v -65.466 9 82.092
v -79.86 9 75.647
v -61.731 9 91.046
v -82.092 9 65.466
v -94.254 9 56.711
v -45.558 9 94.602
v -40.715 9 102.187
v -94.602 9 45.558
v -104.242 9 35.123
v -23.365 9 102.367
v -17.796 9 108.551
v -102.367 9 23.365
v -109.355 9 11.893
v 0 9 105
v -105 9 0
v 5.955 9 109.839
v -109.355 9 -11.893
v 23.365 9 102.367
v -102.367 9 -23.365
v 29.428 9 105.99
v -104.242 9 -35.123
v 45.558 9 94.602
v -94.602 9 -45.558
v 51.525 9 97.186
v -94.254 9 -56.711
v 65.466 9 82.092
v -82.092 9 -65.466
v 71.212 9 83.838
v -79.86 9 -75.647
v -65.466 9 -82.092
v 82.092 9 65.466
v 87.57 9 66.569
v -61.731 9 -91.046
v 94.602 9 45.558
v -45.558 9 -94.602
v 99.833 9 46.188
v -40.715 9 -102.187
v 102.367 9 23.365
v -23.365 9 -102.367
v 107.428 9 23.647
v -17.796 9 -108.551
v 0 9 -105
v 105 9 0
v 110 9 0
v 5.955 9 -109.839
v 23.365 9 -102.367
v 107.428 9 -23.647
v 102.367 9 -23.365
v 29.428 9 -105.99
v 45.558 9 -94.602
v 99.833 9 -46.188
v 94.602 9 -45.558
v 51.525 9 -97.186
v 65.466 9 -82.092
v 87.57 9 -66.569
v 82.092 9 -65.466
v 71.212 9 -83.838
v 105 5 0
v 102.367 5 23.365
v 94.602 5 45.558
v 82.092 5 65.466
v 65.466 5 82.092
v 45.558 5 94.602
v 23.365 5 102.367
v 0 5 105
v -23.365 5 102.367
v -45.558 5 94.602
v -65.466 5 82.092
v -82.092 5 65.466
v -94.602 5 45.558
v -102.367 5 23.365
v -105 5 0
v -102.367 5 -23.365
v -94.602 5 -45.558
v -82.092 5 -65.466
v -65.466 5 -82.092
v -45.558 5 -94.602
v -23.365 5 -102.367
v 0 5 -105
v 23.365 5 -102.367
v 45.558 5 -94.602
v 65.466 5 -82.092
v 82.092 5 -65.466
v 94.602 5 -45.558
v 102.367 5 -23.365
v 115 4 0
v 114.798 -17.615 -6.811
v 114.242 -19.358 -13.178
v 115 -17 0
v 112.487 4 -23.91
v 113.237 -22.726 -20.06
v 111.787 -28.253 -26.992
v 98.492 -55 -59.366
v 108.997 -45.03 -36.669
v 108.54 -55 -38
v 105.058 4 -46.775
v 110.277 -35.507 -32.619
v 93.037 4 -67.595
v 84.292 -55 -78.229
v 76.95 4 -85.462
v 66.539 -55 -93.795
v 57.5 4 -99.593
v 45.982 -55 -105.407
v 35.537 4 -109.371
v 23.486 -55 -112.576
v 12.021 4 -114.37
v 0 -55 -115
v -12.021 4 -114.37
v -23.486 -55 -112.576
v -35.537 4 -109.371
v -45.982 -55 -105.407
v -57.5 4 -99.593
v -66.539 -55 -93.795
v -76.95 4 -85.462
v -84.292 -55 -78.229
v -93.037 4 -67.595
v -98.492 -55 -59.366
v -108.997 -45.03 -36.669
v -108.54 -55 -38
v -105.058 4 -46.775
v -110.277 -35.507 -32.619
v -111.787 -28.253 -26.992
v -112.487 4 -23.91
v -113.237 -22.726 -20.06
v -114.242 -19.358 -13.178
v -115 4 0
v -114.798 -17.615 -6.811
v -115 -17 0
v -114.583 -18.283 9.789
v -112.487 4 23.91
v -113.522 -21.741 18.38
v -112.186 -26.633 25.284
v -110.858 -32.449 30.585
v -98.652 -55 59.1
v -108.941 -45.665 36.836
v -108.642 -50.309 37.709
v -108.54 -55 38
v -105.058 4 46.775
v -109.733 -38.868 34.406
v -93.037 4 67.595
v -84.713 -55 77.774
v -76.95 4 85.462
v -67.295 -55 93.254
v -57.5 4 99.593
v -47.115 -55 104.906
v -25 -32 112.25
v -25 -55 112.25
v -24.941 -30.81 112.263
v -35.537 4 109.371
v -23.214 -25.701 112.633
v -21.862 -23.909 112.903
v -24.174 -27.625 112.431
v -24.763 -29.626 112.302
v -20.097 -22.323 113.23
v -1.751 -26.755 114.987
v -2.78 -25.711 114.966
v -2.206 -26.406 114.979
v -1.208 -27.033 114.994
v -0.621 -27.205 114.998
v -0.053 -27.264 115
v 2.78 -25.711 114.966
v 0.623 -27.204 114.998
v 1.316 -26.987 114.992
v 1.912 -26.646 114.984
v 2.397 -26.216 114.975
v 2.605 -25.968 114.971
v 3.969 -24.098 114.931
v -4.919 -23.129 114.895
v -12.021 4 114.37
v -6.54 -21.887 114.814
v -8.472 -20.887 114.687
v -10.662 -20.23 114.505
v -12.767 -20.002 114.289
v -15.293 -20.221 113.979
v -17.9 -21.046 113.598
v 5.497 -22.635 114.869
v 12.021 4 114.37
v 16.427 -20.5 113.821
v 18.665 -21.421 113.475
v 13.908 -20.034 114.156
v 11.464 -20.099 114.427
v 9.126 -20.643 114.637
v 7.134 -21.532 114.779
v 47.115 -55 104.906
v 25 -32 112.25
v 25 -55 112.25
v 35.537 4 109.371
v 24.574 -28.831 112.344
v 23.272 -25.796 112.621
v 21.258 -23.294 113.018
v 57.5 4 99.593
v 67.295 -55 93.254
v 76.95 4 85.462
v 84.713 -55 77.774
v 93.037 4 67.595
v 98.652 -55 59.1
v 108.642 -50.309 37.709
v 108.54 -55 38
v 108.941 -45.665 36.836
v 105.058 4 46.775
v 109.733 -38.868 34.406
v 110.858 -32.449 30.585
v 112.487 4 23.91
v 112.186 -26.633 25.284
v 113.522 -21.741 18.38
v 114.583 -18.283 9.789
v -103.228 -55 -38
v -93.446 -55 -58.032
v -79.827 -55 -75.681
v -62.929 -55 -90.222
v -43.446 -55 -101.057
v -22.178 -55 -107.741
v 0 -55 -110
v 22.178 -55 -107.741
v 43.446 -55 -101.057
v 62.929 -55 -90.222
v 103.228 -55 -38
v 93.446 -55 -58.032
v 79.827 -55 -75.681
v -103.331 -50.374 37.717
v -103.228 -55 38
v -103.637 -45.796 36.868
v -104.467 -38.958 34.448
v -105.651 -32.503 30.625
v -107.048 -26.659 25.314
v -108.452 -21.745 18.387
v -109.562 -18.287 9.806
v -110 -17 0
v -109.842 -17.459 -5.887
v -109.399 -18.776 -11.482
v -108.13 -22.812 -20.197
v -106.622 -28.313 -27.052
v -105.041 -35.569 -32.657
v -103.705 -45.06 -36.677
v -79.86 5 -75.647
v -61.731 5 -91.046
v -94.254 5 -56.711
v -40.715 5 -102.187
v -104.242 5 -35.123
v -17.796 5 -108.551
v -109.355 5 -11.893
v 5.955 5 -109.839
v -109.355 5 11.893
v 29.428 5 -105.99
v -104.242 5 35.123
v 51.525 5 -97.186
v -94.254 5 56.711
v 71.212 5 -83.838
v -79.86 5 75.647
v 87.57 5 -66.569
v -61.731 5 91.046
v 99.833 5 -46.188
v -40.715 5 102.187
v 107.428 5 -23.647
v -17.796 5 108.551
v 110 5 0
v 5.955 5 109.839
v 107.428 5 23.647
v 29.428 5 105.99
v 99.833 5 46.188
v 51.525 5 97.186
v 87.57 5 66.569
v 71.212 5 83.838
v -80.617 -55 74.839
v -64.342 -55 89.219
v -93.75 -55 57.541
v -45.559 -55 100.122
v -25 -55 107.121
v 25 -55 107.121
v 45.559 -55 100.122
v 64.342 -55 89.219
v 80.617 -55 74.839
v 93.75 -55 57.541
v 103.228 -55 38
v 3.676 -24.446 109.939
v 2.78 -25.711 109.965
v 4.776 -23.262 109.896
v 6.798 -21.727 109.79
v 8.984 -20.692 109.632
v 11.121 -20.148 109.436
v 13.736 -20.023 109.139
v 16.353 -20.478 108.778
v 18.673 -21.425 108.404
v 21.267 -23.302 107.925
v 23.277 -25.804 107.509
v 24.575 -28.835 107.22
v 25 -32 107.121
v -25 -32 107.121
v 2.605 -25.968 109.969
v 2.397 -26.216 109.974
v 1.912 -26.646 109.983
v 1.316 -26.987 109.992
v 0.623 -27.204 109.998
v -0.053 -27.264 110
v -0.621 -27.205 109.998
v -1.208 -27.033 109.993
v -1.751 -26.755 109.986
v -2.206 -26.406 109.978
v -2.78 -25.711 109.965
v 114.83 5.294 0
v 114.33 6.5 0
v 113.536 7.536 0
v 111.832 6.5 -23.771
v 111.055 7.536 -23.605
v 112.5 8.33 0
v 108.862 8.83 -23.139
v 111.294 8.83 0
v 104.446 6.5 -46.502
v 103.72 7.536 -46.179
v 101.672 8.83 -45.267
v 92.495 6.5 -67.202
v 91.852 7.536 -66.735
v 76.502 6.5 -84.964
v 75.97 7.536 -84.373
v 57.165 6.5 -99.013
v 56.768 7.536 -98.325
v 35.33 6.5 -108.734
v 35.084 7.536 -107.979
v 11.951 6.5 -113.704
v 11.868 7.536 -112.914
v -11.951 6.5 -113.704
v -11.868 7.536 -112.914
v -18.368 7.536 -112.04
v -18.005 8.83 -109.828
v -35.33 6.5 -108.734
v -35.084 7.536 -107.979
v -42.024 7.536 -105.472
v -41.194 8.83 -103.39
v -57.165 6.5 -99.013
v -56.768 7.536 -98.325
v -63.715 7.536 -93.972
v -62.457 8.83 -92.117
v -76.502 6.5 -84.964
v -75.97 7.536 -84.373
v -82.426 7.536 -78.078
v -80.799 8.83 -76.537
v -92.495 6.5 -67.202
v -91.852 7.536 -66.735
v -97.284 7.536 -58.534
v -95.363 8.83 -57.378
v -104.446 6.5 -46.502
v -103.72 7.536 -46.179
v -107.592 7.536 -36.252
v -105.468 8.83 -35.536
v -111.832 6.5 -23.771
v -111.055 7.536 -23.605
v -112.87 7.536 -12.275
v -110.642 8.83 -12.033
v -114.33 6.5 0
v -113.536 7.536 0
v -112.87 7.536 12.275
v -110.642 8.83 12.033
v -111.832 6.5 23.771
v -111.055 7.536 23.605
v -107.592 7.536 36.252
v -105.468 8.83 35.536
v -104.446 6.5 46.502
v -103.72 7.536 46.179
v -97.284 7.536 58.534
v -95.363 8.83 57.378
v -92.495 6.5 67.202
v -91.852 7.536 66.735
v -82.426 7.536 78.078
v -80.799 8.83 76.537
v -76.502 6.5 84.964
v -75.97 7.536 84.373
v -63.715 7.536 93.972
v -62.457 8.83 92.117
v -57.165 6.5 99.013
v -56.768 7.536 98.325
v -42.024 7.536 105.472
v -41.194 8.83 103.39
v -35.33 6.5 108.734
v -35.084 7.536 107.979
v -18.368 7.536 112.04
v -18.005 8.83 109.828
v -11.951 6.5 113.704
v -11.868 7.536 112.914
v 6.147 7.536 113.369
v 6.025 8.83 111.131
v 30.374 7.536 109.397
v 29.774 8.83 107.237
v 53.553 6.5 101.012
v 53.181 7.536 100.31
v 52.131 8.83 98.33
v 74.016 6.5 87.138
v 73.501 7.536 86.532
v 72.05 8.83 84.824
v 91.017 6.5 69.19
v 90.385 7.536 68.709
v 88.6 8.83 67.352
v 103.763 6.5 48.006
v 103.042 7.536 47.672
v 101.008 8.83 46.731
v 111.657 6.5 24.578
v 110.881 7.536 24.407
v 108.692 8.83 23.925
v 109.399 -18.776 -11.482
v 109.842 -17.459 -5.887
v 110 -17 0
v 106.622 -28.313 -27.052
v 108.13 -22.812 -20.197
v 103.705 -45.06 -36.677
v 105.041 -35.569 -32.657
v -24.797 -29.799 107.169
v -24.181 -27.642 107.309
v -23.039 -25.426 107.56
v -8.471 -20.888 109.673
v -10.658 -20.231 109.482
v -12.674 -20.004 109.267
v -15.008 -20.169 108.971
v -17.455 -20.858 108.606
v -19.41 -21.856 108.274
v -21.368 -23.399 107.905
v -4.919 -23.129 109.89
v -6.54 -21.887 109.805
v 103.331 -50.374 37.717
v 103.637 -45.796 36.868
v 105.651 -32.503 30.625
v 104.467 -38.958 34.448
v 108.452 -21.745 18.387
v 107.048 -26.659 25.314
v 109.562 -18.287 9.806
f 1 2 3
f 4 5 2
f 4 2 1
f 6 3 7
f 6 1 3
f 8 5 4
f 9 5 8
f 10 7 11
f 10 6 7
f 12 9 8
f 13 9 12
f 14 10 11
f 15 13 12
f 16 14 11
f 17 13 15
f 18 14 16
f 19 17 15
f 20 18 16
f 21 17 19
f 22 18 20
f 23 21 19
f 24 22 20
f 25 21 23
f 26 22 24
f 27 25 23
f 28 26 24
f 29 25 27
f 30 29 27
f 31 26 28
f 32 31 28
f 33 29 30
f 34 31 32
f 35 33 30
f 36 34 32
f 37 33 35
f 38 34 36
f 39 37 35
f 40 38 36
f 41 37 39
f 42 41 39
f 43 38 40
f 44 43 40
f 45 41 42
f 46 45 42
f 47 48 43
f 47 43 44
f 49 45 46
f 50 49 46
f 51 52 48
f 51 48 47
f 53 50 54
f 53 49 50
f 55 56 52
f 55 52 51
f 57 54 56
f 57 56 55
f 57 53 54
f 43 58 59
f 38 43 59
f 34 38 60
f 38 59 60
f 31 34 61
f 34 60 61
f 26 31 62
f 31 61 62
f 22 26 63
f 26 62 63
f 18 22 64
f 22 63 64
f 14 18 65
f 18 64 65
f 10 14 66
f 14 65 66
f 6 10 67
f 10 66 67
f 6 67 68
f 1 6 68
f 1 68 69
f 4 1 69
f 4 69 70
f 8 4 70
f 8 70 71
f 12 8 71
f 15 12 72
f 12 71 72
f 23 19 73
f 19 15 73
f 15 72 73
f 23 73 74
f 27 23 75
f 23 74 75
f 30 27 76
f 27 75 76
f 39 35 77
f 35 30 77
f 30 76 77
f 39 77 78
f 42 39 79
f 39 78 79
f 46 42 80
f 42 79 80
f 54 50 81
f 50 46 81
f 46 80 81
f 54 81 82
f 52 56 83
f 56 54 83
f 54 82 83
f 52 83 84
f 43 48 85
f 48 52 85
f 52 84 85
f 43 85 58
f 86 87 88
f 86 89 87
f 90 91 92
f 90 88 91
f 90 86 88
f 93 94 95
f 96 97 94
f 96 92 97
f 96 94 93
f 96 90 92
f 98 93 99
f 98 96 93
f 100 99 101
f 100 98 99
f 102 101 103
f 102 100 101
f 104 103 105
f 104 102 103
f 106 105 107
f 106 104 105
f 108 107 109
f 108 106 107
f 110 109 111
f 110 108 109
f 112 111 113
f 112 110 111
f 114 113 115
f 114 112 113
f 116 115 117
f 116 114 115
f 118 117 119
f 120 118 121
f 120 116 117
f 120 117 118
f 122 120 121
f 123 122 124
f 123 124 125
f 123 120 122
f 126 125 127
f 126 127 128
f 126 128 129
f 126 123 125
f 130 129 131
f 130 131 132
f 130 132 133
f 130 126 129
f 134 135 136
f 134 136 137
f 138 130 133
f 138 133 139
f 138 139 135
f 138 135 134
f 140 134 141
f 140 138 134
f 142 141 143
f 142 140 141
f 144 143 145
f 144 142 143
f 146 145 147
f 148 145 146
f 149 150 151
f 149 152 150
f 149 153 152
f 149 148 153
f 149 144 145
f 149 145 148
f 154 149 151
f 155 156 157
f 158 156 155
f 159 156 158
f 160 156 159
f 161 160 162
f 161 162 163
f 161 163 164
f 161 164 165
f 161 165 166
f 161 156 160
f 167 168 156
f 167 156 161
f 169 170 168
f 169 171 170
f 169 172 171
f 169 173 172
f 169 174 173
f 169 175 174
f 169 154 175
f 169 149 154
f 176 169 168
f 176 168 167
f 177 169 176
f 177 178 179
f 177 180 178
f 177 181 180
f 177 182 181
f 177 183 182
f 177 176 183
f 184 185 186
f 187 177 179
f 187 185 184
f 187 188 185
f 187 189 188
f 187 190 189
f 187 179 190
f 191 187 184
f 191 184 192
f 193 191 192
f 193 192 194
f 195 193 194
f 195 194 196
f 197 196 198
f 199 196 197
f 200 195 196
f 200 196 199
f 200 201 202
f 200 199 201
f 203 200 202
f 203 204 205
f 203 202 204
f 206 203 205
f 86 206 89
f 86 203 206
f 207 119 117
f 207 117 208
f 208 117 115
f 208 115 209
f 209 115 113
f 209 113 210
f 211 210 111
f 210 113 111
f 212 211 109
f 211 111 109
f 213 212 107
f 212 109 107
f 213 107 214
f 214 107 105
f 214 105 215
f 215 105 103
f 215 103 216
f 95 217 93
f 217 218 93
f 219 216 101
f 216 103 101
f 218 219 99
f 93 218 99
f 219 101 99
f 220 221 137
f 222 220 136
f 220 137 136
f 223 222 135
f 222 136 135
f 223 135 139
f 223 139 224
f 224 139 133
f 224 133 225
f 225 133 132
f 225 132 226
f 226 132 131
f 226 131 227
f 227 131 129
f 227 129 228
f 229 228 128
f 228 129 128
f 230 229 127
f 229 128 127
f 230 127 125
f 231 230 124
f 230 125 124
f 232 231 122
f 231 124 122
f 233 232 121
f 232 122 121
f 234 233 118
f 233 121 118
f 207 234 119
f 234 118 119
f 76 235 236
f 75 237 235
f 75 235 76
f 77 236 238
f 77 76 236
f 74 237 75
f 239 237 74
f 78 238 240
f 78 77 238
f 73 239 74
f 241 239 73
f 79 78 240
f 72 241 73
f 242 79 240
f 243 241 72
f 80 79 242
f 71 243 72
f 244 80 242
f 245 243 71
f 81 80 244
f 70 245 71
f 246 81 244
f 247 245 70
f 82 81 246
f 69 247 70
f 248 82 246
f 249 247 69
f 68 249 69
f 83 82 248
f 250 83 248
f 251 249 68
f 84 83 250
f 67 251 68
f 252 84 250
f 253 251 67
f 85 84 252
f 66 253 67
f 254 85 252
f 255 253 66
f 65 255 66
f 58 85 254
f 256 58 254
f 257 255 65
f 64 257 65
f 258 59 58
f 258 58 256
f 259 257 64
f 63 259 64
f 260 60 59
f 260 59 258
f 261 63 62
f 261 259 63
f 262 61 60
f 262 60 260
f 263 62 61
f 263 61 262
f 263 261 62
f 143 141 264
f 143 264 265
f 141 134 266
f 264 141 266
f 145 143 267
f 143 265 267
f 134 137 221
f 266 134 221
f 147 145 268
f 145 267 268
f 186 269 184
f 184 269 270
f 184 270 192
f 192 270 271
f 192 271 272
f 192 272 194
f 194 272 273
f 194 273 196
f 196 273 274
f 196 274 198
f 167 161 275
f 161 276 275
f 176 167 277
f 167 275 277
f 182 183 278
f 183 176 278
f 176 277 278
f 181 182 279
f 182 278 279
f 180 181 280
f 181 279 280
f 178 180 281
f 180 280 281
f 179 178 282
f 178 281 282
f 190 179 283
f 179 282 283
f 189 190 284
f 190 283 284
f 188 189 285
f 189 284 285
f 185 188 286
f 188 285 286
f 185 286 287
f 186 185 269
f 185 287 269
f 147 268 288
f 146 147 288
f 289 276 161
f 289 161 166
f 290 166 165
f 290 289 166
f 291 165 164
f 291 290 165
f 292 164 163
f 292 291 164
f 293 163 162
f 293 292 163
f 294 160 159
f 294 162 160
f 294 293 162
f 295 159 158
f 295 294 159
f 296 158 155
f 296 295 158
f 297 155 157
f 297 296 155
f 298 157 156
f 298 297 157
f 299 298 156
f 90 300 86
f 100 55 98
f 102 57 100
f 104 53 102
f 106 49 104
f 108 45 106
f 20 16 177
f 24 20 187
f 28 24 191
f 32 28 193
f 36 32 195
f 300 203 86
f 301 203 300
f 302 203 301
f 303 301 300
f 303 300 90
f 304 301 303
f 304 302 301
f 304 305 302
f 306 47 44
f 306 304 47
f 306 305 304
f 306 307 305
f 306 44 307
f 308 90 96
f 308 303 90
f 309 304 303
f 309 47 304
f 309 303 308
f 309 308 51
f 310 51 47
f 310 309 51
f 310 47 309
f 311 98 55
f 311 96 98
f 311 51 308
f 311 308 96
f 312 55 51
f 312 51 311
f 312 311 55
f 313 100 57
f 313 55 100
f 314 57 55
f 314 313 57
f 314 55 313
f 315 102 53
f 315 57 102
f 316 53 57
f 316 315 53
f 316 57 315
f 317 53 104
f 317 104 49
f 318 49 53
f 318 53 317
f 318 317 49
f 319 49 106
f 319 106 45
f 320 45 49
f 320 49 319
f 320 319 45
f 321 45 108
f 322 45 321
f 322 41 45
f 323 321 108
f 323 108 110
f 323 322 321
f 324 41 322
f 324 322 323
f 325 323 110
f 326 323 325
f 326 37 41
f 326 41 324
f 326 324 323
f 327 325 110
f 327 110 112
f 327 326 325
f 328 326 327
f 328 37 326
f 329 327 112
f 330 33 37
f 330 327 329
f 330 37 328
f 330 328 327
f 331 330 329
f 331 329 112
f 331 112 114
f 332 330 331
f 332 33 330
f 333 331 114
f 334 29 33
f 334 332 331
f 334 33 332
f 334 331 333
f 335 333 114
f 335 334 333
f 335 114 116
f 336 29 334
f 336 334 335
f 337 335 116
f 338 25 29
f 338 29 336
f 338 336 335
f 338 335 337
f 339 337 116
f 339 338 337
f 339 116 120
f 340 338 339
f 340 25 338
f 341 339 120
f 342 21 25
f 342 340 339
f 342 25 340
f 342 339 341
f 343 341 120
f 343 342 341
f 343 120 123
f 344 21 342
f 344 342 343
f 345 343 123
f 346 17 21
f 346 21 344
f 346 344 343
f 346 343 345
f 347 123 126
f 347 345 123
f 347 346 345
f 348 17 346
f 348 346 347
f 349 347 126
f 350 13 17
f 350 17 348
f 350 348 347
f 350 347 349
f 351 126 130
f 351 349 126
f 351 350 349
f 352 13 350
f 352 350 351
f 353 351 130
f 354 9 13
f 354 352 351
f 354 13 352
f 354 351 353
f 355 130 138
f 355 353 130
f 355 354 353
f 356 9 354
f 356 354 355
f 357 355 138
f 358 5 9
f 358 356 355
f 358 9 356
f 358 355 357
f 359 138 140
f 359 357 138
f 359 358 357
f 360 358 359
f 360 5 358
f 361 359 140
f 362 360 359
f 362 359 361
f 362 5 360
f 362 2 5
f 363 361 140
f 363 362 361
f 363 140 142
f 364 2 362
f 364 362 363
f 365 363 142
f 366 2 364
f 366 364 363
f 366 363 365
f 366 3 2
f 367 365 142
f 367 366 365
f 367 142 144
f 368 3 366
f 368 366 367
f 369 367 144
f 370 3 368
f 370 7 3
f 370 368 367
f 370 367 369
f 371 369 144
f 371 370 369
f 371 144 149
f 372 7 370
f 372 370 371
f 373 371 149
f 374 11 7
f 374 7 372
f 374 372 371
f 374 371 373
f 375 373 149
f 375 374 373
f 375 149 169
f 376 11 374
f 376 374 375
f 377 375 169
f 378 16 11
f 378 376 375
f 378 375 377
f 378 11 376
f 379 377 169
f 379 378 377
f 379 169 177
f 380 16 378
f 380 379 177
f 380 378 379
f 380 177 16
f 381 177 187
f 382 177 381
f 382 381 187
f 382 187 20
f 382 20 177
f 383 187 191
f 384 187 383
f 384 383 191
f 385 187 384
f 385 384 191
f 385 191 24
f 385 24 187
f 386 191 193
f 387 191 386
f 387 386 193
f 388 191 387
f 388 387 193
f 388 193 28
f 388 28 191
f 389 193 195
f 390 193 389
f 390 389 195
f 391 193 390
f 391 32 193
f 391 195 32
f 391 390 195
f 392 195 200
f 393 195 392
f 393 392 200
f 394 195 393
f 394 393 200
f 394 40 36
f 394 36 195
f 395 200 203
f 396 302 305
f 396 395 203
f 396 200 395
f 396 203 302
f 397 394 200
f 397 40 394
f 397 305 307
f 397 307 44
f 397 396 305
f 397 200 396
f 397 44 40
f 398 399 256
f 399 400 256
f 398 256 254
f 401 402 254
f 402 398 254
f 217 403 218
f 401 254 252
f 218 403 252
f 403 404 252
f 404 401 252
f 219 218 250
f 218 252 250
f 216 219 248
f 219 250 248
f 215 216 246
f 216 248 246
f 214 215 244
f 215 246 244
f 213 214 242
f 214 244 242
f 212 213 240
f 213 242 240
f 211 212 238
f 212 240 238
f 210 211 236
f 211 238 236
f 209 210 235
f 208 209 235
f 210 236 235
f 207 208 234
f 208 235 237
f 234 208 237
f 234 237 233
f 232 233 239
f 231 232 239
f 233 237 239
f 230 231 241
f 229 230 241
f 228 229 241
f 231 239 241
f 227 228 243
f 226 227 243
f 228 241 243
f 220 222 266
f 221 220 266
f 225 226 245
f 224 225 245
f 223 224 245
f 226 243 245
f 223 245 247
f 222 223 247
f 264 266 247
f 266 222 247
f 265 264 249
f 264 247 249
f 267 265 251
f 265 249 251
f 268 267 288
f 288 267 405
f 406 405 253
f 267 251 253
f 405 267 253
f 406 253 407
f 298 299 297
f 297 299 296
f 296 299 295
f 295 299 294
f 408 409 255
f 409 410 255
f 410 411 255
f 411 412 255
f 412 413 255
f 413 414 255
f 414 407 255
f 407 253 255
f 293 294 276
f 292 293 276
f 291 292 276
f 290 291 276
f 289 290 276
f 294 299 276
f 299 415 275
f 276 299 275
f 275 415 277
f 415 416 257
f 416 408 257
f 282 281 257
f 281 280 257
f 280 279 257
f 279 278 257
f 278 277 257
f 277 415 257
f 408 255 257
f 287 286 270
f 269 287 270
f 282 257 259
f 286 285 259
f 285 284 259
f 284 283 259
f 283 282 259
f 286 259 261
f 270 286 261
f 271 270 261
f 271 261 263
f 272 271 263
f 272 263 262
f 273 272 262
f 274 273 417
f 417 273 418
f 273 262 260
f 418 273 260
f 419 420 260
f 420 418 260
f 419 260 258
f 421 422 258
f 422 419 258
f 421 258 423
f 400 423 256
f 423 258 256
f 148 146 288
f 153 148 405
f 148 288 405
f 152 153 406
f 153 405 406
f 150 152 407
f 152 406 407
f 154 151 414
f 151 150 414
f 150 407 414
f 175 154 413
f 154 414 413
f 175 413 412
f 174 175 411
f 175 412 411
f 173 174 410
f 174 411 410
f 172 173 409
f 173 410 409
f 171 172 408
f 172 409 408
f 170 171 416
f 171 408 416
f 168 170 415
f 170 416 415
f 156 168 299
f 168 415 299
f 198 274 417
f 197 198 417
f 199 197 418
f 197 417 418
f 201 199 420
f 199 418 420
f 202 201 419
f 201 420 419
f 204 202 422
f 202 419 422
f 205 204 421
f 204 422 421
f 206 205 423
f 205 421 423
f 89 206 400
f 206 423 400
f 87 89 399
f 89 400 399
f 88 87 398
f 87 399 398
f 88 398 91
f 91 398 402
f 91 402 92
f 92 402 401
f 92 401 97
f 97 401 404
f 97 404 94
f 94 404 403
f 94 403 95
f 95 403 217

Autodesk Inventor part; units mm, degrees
ref_plane "YZ Plane" through (0, 0, 0) normal (1, 0, 0) x (0, 1, 0)
ref_plane "XZ Plane" through (0, 0, 0) normal (0, 1, 0) x (-1, 0, 0)
ref_plane "XY Plane" through (0, 0, 0) normal (0, 0, 1) x (1, 0, 0)
sketch "草圖1" plane through (0, 0, 0) normal (0, 1, 0) x (-1, 0, 0)
  circle A0 centre (0, 0) radius 110
  dimension "d0" = 220
extrude "擠出1" add sketch "草圖1" along normal blind 4
sketch "草圖2" plane through (0, 4, 0) normal (0, 1, 0) x (1, 0, 0)
  circle A0 centre (0, 0) radius 110 projected
sketch "草圖3" plane through (0, 4, 0) normal (0, 1, 0) x (1, 0, 0)
  circle A0 centre (0, 0) radius 110 projected
  circle A1 centre (0, 0) radius 115
  circle A2 centre (0, 0) radius 105
  dimension "d3" = 5
  dimension "d4" = 5
extrude "擠出2" add sketch "草圖3" against normal blind 59 contours A1
sketch "草圖4" plane through (0, 4, 0) normal (0, 1, 0) x (1, 0, 0)
  circle A0 centre (0, 0) radius 115 projected
  circle A1 centre (0, 0) radius 110
  circle A2 centre (0, 0) radius 105
  dimension "d7" = 5
extrude "擠出3" add sketch "草圖4" along normal blind 5 contours A0 | A1
sketch "草圖5" plane through (0, 0, 0) normal (0, -1, 0) x (1, 0, 0)
  circle A0 centre (0, 0) radius 110 projected
  circle A1 centre (0, 0) radius 110
  dimension "d10" = 220
extrude "擠出4" cut sketch "草圖5" against normal blind 5
fillet "圓角2" radius 5 1 edges at (-115, 9, 0)
sketch "草圖6" plane through (0, 0, 0) normal (0, 0, 1) x (1, 0, 0)
  line L0 (-115, -55) -> (115, -55) projected
  line L1 (0, -53) -> (25, -53)
  line L2 (0, -53) -> (-25, -53)
  line L3 (-25, -53) -> (-25, -32)
  line L4 (25, -53) -> (25, -32)
  line L5 (-25, -32) -> (-13, -32)
  circle A0 centre (-13, -32) radius 8.1
  arc A1 (-2.7801, -25.7108) -> (-25, -32) centre (-13, -32) ccw
  circle A2 centre (13, -32) radius 8.1
  arc A3 (25, -32) -> (2.7801, -25.7108) centre (13, -32) ccw
  arc A4 (-2.7801, -25.7108) -> (2.7801, -25.7108) centre (0, -24) ccw
  line L6 (0, -55) -> (-25, -55)
  line L7 (-25, -55) -> (-25, -53)
  line L8 (0, -55) -> (25, -55)
  line L9 (25, -53) -> (25, -55)
  point P0 (0, 0)
  dimension "d15" = 25
  dimension "d16" = 25
  dimension "d17" = 21
  dimension "d18" = 21
  dimension "d19" = 12
  dimension "d20" = 16.2
  dimension "d22" = 25
  dimension "d23" = 2
extrude "擠出5" cut sketch "草圖6" along normal blind 200 contours L7 L2 L1 L9 L0 | A0 | L3 A1 A4 A3 L4 L1 L2 | A2
sketch "草圖7" plane through (0, 0, 0) normal (1, 0, 0) x (0, 1, 0)
  line L0 (-55, 112.2497) -> (-55, -115) projected
  line L1 (-55, 0) -> (-55, -38)
  line L2 (-55, 0) -> (-55, 38)
  circle A0 centre (-55, 0) radius 38
  point P0 (0, 0)
  dimension "d26" = 38
  dimension "d27" = 38
extrude "擠出6" cut sketch "草圖7" along normal mid plane 400 contours A0 L0 picked at (-29.9842, -2.8186)
properties part number "Shell-disc"
